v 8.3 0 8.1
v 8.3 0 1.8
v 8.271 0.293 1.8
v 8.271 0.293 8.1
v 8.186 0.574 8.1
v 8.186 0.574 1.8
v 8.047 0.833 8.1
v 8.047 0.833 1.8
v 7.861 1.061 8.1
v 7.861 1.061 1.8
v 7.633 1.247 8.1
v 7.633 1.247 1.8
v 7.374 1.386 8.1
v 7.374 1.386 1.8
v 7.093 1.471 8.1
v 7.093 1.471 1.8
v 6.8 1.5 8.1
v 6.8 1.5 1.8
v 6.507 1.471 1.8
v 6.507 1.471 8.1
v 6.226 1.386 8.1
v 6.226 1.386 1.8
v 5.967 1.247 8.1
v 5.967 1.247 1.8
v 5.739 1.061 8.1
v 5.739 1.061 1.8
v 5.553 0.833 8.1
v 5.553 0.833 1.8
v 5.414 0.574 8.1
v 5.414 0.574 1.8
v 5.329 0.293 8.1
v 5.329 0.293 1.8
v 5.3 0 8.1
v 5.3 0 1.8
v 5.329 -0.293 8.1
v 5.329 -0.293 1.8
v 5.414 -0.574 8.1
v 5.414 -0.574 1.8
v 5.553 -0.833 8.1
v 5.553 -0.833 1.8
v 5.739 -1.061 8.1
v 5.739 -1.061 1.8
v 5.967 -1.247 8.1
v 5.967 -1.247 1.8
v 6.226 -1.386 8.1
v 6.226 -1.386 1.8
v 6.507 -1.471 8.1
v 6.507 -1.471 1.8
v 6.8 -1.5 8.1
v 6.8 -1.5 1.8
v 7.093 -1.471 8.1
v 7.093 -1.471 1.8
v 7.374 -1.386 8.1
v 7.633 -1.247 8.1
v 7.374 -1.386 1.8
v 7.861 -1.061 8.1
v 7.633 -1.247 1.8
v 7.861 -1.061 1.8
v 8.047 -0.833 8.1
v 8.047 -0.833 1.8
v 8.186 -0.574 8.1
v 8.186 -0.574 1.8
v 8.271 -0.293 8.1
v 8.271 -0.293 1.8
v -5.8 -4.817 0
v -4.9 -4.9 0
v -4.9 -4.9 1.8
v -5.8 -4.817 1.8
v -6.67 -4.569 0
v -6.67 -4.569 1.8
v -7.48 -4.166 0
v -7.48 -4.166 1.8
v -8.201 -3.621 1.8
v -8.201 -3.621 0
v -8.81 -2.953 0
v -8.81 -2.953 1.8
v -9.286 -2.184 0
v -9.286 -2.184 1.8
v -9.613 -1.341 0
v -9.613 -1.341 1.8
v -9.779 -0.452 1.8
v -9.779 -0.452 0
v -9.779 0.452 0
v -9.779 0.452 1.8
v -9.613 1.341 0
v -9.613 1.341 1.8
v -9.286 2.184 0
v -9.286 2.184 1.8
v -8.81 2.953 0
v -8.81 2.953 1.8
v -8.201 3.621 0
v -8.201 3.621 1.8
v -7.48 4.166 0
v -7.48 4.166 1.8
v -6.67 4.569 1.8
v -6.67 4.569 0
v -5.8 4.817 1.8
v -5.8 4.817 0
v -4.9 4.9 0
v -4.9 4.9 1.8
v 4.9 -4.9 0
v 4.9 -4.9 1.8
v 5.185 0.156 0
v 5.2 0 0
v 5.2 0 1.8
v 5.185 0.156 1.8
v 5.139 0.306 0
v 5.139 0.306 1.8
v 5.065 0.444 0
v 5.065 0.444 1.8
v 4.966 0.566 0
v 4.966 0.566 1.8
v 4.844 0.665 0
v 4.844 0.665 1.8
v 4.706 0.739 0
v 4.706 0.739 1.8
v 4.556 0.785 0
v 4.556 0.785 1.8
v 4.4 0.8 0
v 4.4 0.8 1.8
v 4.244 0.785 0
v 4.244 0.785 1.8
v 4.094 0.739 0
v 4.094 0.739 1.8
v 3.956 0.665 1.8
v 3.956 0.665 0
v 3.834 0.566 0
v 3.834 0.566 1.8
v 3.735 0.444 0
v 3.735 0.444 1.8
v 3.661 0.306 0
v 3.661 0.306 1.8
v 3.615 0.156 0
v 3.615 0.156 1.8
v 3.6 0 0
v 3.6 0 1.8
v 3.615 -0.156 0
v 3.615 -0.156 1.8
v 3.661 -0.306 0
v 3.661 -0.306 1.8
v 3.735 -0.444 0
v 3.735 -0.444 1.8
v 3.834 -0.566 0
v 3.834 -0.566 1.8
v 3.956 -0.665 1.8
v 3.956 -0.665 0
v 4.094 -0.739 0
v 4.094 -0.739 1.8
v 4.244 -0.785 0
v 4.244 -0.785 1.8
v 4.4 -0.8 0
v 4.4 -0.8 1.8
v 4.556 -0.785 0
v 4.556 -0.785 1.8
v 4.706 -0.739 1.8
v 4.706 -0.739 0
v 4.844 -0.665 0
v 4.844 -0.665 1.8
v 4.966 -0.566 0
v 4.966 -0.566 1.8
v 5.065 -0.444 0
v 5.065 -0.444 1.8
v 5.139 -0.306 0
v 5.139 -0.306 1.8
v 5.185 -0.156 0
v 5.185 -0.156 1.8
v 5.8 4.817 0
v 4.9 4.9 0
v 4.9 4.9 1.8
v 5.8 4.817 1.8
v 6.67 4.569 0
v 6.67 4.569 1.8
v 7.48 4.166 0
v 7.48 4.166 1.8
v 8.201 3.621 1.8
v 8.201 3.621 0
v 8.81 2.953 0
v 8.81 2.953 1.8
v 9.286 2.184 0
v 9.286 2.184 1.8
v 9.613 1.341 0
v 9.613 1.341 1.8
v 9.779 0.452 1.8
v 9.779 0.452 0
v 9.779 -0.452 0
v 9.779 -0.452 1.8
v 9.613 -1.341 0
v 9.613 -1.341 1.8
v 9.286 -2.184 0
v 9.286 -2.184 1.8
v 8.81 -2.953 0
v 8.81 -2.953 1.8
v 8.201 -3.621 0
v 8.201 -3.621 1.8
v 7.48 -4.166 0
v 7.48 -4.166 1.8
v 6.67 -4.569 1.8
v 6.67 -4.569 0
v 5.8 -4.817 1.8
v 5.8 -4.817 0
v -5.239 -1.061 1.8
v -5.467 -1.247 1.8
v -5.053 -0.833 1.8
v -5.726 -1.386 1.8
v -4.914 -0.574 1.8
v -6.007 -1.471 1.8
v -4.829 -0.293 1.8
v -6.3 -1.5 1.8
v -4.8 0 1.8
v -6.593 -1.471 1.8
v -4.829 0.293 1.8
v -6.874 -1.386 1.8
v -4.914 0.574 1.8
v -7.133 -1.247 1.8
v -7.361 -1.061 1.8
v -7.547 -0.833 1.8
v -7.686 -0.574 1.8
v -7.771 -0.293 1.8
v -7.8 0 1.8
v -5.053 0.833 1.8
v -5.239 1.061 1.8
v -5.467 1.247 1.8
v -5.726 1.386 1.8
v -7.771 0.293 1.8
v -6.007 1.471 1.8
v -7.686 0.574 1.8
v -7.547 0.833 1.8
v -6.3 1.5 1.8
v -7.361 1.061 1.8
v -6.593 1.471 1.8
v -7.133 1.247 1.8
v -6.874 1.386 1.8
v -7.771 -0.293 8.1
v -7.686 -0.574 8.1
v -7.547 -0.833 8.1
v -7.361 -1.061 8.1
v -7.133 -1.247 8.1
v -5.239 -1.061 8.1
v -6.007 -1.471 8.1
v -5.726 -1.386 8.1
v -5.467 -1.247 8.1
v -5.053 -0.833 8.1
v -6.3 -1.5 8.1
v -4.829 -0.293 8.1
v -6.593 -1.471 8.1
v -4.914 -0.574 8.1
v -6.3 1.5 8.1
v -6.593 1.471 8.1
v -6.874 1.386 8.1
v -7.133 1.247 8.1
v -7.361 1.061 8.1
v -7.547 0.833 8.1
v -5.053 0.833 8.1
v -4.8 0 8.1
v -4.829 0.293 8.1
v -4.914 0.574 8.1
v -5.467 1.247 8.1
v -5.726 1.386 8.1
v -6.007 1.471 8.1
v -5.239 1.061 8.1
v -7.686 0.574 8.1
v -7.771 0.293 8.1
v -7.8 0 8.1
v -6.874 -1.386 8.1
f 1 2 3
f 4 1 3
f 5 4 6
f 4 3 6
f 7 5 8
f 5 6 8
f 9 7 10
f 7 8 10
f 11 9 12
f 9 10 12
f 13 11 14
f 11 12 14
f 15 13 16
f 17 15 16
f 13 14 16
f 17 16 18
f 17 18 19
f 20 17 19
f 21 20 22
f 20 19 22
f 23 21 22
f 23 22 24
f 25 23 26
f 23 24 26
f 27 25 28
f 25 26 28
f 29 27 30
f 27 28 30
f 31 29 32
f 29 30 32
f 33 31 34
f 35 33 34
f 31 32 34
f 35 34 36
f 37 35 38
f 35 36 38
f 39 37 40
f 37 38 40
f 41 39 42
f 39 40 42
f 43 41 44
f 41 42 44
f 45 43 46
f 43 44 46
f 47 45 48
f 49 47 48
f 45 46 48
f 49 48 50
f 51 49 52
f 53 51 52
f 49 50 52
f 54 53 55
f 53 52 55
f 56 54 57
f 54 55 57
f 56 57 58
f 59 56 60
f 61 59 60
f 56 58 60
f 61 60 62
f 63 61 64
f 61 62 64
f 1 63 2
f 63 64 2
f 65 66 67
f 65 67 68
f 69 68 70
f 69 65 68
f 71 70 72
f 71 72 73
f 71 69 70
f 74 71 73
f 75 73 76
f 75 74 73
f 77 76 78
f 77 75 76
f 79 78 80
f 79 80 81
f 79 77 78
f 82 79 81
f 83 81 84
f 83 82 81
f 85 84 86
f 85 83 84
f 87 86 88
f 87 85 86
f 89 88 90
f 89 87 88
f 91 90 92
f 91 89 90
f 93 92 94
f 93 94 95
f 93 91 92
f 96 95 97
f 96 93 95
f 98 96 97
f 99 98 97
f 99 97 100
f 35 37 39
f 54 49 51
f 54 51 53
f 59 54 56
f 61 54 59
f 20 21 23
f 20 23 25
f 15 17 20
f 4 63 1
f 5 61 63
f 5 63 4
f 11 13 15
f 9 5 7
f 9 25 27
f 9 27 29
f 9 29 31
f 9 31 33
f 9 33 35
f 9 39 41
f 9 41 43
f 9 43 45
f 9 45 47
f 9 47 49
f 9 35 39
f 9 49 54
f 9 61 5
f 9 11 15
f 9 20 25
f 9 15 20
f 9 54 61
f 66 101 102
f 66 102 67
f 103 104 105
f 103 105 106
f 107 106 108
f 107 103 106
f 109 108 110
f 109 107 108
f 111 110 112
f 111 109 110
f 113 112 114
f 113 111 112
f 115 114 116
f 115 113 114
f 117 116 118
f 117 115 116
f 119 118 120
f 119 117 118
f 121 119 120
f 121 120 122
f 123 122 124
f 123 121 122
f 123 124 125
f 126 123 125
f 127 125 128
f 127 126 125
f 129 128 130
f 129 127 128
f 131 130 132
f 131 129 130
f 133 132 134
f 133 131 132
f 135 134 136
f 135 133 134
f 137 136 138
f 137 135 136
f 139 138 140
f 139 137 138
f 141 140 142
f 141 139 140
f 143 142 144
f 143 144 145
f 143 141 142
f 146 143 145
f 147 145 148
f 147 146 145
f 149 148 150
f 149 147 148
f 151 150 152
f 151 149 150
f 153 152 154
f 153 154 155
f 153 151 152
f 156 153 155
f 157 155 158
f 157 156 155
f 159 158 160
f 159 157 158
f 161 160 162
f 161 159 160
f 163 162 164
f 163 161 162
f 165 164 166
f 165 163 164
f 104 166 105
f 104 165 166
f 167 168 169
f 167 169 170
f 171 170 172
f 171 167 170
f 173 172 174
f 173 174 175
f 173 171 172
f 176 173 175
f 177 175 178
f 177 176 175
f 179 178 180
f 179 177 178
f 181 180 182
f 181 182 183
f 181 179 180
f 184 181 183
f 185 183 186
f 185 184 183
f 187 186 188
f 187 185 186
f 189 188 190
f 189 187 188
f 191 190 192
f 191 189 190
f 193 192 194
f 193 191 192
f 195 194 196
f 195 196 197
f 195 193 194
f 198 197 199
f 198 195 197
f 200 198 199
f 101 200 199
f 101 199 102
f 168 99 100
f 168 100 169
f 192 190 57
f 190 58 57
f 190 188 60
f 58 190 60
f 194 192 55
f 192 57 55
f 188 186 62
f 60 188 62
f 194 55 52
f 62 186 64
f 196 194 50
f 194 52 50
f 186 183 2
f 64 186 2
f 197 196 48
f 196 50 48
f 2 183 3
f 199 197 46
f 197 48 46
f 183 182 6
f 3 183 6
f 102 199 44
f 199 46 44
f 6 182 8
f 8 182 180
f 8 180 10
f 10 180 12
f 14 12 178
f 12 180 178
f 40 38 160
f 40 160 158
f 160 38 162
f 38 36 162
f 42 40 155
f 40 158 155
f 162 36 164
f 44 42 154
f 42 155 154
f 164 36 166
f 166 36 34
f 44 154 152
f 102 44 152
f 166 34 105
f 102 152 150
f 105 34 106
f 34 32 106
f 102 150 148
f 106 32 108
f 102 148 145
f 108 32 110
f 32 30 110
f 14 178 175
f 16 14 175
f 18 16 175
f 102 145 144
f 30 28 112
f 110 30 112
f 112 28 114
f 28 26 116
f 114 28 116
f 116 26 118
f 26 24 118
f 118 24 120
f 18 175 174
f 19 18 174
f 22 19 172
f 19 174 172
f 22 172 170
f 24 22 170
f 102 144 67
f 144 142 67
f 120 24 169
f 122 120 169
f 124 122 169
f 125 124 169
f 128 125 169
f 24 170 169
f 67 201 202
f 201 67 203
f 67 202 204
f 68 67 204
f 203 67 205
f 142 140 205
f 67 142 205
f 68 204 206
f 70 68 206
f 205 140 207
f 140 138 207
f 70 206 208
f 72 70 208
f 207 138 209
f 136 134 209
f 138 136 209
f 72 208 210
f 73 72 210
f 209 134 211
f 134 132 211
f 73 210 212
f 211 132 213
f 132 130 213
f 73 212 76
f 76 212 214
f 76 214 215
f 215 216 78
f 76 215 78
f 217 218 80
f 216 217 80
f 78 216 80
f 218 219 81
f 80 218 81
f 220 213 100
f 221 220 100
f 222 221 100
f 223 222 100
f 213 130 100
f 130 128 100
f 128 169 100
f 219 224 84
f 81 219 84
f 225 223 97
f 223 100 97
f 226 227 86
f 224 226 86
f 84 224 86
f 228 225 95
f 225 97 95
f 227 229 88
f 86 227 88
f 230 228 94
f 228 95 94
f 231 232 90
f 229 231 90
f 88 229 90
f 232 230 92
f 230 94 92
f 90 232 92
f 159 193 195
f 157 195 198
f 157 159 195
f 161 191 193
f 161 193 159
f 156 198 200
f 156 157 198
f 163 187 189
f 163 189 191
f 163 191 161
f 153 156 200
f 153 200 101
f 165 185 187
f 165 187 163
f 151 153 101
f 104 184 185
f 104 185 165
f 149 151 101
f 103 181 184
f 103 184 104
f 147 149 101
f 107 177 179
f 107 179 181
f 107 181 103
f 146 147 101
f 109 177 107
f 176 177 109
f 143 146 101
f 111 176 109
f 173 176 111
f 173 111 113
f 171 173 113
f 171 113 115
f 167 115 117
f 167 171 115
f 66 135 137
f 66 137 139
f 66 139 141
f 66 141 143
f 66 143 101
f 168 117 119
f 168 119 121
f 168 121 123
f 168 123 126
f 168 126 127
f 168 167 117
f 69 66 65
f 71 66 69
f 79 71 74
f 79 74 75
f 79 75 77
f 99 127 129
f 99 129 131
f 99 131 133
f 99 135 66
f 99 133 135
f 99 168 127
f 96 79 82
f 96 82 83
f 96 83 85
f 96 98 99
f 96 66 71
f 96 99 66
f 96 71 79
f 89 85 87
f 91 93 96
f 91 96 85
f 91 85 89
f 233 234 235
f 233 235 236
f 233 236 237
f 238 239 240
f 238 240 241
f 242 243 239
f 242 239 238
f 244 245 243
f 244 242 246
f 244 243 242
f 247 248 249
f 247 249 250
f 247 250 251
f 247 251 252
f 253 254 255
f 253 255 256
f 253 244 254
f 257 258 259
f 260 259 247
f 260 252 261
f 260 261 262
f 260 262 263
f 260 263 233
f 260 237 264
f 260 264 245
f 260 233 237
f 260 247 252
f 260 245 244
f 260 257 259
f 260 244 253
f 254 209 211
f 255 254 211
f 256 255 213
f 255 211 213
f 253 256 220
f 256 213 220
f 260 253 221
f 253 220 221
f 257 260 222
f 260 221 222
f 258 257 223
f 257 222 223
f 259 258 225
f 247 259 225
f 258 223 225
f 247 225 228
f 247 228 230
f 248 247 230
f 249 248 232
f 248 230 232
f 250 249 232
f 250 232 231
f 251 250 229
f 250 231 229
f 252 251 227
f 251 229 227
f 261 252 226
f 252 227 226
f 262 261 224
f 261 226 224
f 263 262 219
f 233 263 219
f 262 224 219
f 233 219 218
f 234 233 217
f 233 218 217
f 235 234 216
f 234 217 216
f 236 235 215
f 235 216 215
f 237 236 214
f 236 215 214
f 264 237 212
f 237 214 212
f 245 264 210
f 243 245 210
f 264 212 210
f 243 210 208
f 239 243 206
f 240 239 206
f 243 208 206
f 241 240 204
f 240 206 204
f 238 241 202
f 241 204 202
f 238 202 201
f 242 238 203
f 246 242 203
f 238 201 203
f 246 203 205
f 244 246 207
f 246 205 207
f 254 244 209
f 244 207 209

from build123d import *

# Parameters (mm, degrees)
SCHIZZO1_R                   = 0.8
ESTRUSIONE_ESTRUSIONE1_DEPTH = 1.8
SCHIZZO2_R                   = 1.5
ESTRUSIONE_ESTRUSIONE2_DEPTH = 6.3
SCHIZZO3_R                   = 1.5
ESTRUSIONE_ESTRUSIONE3_DEPTH = 6.3


with BuildPart() as part:
    # Schizzo1 → Estrusione-Estrusione1 (new body)
    with BuildSketch(Plane.XY):
        with BuildLine():
            Line((-4.9, 4.9), (4.9, 4.9))
            ThreePointArc((4.9, 4.9), (9.8, 0), (4.9, -4.9))
            Line((4.9, -4.9), (-4.9, -4.9))
            ThreePointArc((-4.9, -4.9), (-9.8, 0), (-4.9, 4.9))
        make_face()
        with Locations((4.4, 0)):
            Circle(SCHIZZO1_R, mode=Mode.SUBTRACT)
    extrude(amount=ESTRUSIONE_ESTRUSIONE1_DEPTH)

    # Schizzo2 → Estrusione-Estrusione2 (add)
    with BuildSketch(Plane.XY.offset(1.8)):
        with Locations((-6.3, 0)):
            Circle(SCHIZZO2_R)
    extrude(amount=ESTRUSIONE_ESTRUSIONE2_DEPTH)

    # Schizzo3 → Estrusione-Estrusione3 (add)
    with BuildSketch(Plane.XY.offset(1.8)):
        with Locations((6.8, 0)):
            Circle(SCHIZZO3_R)
    extrude(amount=ESTRUSIONE_ESTRUSIONE3_DEPTH)


solid = part.part
